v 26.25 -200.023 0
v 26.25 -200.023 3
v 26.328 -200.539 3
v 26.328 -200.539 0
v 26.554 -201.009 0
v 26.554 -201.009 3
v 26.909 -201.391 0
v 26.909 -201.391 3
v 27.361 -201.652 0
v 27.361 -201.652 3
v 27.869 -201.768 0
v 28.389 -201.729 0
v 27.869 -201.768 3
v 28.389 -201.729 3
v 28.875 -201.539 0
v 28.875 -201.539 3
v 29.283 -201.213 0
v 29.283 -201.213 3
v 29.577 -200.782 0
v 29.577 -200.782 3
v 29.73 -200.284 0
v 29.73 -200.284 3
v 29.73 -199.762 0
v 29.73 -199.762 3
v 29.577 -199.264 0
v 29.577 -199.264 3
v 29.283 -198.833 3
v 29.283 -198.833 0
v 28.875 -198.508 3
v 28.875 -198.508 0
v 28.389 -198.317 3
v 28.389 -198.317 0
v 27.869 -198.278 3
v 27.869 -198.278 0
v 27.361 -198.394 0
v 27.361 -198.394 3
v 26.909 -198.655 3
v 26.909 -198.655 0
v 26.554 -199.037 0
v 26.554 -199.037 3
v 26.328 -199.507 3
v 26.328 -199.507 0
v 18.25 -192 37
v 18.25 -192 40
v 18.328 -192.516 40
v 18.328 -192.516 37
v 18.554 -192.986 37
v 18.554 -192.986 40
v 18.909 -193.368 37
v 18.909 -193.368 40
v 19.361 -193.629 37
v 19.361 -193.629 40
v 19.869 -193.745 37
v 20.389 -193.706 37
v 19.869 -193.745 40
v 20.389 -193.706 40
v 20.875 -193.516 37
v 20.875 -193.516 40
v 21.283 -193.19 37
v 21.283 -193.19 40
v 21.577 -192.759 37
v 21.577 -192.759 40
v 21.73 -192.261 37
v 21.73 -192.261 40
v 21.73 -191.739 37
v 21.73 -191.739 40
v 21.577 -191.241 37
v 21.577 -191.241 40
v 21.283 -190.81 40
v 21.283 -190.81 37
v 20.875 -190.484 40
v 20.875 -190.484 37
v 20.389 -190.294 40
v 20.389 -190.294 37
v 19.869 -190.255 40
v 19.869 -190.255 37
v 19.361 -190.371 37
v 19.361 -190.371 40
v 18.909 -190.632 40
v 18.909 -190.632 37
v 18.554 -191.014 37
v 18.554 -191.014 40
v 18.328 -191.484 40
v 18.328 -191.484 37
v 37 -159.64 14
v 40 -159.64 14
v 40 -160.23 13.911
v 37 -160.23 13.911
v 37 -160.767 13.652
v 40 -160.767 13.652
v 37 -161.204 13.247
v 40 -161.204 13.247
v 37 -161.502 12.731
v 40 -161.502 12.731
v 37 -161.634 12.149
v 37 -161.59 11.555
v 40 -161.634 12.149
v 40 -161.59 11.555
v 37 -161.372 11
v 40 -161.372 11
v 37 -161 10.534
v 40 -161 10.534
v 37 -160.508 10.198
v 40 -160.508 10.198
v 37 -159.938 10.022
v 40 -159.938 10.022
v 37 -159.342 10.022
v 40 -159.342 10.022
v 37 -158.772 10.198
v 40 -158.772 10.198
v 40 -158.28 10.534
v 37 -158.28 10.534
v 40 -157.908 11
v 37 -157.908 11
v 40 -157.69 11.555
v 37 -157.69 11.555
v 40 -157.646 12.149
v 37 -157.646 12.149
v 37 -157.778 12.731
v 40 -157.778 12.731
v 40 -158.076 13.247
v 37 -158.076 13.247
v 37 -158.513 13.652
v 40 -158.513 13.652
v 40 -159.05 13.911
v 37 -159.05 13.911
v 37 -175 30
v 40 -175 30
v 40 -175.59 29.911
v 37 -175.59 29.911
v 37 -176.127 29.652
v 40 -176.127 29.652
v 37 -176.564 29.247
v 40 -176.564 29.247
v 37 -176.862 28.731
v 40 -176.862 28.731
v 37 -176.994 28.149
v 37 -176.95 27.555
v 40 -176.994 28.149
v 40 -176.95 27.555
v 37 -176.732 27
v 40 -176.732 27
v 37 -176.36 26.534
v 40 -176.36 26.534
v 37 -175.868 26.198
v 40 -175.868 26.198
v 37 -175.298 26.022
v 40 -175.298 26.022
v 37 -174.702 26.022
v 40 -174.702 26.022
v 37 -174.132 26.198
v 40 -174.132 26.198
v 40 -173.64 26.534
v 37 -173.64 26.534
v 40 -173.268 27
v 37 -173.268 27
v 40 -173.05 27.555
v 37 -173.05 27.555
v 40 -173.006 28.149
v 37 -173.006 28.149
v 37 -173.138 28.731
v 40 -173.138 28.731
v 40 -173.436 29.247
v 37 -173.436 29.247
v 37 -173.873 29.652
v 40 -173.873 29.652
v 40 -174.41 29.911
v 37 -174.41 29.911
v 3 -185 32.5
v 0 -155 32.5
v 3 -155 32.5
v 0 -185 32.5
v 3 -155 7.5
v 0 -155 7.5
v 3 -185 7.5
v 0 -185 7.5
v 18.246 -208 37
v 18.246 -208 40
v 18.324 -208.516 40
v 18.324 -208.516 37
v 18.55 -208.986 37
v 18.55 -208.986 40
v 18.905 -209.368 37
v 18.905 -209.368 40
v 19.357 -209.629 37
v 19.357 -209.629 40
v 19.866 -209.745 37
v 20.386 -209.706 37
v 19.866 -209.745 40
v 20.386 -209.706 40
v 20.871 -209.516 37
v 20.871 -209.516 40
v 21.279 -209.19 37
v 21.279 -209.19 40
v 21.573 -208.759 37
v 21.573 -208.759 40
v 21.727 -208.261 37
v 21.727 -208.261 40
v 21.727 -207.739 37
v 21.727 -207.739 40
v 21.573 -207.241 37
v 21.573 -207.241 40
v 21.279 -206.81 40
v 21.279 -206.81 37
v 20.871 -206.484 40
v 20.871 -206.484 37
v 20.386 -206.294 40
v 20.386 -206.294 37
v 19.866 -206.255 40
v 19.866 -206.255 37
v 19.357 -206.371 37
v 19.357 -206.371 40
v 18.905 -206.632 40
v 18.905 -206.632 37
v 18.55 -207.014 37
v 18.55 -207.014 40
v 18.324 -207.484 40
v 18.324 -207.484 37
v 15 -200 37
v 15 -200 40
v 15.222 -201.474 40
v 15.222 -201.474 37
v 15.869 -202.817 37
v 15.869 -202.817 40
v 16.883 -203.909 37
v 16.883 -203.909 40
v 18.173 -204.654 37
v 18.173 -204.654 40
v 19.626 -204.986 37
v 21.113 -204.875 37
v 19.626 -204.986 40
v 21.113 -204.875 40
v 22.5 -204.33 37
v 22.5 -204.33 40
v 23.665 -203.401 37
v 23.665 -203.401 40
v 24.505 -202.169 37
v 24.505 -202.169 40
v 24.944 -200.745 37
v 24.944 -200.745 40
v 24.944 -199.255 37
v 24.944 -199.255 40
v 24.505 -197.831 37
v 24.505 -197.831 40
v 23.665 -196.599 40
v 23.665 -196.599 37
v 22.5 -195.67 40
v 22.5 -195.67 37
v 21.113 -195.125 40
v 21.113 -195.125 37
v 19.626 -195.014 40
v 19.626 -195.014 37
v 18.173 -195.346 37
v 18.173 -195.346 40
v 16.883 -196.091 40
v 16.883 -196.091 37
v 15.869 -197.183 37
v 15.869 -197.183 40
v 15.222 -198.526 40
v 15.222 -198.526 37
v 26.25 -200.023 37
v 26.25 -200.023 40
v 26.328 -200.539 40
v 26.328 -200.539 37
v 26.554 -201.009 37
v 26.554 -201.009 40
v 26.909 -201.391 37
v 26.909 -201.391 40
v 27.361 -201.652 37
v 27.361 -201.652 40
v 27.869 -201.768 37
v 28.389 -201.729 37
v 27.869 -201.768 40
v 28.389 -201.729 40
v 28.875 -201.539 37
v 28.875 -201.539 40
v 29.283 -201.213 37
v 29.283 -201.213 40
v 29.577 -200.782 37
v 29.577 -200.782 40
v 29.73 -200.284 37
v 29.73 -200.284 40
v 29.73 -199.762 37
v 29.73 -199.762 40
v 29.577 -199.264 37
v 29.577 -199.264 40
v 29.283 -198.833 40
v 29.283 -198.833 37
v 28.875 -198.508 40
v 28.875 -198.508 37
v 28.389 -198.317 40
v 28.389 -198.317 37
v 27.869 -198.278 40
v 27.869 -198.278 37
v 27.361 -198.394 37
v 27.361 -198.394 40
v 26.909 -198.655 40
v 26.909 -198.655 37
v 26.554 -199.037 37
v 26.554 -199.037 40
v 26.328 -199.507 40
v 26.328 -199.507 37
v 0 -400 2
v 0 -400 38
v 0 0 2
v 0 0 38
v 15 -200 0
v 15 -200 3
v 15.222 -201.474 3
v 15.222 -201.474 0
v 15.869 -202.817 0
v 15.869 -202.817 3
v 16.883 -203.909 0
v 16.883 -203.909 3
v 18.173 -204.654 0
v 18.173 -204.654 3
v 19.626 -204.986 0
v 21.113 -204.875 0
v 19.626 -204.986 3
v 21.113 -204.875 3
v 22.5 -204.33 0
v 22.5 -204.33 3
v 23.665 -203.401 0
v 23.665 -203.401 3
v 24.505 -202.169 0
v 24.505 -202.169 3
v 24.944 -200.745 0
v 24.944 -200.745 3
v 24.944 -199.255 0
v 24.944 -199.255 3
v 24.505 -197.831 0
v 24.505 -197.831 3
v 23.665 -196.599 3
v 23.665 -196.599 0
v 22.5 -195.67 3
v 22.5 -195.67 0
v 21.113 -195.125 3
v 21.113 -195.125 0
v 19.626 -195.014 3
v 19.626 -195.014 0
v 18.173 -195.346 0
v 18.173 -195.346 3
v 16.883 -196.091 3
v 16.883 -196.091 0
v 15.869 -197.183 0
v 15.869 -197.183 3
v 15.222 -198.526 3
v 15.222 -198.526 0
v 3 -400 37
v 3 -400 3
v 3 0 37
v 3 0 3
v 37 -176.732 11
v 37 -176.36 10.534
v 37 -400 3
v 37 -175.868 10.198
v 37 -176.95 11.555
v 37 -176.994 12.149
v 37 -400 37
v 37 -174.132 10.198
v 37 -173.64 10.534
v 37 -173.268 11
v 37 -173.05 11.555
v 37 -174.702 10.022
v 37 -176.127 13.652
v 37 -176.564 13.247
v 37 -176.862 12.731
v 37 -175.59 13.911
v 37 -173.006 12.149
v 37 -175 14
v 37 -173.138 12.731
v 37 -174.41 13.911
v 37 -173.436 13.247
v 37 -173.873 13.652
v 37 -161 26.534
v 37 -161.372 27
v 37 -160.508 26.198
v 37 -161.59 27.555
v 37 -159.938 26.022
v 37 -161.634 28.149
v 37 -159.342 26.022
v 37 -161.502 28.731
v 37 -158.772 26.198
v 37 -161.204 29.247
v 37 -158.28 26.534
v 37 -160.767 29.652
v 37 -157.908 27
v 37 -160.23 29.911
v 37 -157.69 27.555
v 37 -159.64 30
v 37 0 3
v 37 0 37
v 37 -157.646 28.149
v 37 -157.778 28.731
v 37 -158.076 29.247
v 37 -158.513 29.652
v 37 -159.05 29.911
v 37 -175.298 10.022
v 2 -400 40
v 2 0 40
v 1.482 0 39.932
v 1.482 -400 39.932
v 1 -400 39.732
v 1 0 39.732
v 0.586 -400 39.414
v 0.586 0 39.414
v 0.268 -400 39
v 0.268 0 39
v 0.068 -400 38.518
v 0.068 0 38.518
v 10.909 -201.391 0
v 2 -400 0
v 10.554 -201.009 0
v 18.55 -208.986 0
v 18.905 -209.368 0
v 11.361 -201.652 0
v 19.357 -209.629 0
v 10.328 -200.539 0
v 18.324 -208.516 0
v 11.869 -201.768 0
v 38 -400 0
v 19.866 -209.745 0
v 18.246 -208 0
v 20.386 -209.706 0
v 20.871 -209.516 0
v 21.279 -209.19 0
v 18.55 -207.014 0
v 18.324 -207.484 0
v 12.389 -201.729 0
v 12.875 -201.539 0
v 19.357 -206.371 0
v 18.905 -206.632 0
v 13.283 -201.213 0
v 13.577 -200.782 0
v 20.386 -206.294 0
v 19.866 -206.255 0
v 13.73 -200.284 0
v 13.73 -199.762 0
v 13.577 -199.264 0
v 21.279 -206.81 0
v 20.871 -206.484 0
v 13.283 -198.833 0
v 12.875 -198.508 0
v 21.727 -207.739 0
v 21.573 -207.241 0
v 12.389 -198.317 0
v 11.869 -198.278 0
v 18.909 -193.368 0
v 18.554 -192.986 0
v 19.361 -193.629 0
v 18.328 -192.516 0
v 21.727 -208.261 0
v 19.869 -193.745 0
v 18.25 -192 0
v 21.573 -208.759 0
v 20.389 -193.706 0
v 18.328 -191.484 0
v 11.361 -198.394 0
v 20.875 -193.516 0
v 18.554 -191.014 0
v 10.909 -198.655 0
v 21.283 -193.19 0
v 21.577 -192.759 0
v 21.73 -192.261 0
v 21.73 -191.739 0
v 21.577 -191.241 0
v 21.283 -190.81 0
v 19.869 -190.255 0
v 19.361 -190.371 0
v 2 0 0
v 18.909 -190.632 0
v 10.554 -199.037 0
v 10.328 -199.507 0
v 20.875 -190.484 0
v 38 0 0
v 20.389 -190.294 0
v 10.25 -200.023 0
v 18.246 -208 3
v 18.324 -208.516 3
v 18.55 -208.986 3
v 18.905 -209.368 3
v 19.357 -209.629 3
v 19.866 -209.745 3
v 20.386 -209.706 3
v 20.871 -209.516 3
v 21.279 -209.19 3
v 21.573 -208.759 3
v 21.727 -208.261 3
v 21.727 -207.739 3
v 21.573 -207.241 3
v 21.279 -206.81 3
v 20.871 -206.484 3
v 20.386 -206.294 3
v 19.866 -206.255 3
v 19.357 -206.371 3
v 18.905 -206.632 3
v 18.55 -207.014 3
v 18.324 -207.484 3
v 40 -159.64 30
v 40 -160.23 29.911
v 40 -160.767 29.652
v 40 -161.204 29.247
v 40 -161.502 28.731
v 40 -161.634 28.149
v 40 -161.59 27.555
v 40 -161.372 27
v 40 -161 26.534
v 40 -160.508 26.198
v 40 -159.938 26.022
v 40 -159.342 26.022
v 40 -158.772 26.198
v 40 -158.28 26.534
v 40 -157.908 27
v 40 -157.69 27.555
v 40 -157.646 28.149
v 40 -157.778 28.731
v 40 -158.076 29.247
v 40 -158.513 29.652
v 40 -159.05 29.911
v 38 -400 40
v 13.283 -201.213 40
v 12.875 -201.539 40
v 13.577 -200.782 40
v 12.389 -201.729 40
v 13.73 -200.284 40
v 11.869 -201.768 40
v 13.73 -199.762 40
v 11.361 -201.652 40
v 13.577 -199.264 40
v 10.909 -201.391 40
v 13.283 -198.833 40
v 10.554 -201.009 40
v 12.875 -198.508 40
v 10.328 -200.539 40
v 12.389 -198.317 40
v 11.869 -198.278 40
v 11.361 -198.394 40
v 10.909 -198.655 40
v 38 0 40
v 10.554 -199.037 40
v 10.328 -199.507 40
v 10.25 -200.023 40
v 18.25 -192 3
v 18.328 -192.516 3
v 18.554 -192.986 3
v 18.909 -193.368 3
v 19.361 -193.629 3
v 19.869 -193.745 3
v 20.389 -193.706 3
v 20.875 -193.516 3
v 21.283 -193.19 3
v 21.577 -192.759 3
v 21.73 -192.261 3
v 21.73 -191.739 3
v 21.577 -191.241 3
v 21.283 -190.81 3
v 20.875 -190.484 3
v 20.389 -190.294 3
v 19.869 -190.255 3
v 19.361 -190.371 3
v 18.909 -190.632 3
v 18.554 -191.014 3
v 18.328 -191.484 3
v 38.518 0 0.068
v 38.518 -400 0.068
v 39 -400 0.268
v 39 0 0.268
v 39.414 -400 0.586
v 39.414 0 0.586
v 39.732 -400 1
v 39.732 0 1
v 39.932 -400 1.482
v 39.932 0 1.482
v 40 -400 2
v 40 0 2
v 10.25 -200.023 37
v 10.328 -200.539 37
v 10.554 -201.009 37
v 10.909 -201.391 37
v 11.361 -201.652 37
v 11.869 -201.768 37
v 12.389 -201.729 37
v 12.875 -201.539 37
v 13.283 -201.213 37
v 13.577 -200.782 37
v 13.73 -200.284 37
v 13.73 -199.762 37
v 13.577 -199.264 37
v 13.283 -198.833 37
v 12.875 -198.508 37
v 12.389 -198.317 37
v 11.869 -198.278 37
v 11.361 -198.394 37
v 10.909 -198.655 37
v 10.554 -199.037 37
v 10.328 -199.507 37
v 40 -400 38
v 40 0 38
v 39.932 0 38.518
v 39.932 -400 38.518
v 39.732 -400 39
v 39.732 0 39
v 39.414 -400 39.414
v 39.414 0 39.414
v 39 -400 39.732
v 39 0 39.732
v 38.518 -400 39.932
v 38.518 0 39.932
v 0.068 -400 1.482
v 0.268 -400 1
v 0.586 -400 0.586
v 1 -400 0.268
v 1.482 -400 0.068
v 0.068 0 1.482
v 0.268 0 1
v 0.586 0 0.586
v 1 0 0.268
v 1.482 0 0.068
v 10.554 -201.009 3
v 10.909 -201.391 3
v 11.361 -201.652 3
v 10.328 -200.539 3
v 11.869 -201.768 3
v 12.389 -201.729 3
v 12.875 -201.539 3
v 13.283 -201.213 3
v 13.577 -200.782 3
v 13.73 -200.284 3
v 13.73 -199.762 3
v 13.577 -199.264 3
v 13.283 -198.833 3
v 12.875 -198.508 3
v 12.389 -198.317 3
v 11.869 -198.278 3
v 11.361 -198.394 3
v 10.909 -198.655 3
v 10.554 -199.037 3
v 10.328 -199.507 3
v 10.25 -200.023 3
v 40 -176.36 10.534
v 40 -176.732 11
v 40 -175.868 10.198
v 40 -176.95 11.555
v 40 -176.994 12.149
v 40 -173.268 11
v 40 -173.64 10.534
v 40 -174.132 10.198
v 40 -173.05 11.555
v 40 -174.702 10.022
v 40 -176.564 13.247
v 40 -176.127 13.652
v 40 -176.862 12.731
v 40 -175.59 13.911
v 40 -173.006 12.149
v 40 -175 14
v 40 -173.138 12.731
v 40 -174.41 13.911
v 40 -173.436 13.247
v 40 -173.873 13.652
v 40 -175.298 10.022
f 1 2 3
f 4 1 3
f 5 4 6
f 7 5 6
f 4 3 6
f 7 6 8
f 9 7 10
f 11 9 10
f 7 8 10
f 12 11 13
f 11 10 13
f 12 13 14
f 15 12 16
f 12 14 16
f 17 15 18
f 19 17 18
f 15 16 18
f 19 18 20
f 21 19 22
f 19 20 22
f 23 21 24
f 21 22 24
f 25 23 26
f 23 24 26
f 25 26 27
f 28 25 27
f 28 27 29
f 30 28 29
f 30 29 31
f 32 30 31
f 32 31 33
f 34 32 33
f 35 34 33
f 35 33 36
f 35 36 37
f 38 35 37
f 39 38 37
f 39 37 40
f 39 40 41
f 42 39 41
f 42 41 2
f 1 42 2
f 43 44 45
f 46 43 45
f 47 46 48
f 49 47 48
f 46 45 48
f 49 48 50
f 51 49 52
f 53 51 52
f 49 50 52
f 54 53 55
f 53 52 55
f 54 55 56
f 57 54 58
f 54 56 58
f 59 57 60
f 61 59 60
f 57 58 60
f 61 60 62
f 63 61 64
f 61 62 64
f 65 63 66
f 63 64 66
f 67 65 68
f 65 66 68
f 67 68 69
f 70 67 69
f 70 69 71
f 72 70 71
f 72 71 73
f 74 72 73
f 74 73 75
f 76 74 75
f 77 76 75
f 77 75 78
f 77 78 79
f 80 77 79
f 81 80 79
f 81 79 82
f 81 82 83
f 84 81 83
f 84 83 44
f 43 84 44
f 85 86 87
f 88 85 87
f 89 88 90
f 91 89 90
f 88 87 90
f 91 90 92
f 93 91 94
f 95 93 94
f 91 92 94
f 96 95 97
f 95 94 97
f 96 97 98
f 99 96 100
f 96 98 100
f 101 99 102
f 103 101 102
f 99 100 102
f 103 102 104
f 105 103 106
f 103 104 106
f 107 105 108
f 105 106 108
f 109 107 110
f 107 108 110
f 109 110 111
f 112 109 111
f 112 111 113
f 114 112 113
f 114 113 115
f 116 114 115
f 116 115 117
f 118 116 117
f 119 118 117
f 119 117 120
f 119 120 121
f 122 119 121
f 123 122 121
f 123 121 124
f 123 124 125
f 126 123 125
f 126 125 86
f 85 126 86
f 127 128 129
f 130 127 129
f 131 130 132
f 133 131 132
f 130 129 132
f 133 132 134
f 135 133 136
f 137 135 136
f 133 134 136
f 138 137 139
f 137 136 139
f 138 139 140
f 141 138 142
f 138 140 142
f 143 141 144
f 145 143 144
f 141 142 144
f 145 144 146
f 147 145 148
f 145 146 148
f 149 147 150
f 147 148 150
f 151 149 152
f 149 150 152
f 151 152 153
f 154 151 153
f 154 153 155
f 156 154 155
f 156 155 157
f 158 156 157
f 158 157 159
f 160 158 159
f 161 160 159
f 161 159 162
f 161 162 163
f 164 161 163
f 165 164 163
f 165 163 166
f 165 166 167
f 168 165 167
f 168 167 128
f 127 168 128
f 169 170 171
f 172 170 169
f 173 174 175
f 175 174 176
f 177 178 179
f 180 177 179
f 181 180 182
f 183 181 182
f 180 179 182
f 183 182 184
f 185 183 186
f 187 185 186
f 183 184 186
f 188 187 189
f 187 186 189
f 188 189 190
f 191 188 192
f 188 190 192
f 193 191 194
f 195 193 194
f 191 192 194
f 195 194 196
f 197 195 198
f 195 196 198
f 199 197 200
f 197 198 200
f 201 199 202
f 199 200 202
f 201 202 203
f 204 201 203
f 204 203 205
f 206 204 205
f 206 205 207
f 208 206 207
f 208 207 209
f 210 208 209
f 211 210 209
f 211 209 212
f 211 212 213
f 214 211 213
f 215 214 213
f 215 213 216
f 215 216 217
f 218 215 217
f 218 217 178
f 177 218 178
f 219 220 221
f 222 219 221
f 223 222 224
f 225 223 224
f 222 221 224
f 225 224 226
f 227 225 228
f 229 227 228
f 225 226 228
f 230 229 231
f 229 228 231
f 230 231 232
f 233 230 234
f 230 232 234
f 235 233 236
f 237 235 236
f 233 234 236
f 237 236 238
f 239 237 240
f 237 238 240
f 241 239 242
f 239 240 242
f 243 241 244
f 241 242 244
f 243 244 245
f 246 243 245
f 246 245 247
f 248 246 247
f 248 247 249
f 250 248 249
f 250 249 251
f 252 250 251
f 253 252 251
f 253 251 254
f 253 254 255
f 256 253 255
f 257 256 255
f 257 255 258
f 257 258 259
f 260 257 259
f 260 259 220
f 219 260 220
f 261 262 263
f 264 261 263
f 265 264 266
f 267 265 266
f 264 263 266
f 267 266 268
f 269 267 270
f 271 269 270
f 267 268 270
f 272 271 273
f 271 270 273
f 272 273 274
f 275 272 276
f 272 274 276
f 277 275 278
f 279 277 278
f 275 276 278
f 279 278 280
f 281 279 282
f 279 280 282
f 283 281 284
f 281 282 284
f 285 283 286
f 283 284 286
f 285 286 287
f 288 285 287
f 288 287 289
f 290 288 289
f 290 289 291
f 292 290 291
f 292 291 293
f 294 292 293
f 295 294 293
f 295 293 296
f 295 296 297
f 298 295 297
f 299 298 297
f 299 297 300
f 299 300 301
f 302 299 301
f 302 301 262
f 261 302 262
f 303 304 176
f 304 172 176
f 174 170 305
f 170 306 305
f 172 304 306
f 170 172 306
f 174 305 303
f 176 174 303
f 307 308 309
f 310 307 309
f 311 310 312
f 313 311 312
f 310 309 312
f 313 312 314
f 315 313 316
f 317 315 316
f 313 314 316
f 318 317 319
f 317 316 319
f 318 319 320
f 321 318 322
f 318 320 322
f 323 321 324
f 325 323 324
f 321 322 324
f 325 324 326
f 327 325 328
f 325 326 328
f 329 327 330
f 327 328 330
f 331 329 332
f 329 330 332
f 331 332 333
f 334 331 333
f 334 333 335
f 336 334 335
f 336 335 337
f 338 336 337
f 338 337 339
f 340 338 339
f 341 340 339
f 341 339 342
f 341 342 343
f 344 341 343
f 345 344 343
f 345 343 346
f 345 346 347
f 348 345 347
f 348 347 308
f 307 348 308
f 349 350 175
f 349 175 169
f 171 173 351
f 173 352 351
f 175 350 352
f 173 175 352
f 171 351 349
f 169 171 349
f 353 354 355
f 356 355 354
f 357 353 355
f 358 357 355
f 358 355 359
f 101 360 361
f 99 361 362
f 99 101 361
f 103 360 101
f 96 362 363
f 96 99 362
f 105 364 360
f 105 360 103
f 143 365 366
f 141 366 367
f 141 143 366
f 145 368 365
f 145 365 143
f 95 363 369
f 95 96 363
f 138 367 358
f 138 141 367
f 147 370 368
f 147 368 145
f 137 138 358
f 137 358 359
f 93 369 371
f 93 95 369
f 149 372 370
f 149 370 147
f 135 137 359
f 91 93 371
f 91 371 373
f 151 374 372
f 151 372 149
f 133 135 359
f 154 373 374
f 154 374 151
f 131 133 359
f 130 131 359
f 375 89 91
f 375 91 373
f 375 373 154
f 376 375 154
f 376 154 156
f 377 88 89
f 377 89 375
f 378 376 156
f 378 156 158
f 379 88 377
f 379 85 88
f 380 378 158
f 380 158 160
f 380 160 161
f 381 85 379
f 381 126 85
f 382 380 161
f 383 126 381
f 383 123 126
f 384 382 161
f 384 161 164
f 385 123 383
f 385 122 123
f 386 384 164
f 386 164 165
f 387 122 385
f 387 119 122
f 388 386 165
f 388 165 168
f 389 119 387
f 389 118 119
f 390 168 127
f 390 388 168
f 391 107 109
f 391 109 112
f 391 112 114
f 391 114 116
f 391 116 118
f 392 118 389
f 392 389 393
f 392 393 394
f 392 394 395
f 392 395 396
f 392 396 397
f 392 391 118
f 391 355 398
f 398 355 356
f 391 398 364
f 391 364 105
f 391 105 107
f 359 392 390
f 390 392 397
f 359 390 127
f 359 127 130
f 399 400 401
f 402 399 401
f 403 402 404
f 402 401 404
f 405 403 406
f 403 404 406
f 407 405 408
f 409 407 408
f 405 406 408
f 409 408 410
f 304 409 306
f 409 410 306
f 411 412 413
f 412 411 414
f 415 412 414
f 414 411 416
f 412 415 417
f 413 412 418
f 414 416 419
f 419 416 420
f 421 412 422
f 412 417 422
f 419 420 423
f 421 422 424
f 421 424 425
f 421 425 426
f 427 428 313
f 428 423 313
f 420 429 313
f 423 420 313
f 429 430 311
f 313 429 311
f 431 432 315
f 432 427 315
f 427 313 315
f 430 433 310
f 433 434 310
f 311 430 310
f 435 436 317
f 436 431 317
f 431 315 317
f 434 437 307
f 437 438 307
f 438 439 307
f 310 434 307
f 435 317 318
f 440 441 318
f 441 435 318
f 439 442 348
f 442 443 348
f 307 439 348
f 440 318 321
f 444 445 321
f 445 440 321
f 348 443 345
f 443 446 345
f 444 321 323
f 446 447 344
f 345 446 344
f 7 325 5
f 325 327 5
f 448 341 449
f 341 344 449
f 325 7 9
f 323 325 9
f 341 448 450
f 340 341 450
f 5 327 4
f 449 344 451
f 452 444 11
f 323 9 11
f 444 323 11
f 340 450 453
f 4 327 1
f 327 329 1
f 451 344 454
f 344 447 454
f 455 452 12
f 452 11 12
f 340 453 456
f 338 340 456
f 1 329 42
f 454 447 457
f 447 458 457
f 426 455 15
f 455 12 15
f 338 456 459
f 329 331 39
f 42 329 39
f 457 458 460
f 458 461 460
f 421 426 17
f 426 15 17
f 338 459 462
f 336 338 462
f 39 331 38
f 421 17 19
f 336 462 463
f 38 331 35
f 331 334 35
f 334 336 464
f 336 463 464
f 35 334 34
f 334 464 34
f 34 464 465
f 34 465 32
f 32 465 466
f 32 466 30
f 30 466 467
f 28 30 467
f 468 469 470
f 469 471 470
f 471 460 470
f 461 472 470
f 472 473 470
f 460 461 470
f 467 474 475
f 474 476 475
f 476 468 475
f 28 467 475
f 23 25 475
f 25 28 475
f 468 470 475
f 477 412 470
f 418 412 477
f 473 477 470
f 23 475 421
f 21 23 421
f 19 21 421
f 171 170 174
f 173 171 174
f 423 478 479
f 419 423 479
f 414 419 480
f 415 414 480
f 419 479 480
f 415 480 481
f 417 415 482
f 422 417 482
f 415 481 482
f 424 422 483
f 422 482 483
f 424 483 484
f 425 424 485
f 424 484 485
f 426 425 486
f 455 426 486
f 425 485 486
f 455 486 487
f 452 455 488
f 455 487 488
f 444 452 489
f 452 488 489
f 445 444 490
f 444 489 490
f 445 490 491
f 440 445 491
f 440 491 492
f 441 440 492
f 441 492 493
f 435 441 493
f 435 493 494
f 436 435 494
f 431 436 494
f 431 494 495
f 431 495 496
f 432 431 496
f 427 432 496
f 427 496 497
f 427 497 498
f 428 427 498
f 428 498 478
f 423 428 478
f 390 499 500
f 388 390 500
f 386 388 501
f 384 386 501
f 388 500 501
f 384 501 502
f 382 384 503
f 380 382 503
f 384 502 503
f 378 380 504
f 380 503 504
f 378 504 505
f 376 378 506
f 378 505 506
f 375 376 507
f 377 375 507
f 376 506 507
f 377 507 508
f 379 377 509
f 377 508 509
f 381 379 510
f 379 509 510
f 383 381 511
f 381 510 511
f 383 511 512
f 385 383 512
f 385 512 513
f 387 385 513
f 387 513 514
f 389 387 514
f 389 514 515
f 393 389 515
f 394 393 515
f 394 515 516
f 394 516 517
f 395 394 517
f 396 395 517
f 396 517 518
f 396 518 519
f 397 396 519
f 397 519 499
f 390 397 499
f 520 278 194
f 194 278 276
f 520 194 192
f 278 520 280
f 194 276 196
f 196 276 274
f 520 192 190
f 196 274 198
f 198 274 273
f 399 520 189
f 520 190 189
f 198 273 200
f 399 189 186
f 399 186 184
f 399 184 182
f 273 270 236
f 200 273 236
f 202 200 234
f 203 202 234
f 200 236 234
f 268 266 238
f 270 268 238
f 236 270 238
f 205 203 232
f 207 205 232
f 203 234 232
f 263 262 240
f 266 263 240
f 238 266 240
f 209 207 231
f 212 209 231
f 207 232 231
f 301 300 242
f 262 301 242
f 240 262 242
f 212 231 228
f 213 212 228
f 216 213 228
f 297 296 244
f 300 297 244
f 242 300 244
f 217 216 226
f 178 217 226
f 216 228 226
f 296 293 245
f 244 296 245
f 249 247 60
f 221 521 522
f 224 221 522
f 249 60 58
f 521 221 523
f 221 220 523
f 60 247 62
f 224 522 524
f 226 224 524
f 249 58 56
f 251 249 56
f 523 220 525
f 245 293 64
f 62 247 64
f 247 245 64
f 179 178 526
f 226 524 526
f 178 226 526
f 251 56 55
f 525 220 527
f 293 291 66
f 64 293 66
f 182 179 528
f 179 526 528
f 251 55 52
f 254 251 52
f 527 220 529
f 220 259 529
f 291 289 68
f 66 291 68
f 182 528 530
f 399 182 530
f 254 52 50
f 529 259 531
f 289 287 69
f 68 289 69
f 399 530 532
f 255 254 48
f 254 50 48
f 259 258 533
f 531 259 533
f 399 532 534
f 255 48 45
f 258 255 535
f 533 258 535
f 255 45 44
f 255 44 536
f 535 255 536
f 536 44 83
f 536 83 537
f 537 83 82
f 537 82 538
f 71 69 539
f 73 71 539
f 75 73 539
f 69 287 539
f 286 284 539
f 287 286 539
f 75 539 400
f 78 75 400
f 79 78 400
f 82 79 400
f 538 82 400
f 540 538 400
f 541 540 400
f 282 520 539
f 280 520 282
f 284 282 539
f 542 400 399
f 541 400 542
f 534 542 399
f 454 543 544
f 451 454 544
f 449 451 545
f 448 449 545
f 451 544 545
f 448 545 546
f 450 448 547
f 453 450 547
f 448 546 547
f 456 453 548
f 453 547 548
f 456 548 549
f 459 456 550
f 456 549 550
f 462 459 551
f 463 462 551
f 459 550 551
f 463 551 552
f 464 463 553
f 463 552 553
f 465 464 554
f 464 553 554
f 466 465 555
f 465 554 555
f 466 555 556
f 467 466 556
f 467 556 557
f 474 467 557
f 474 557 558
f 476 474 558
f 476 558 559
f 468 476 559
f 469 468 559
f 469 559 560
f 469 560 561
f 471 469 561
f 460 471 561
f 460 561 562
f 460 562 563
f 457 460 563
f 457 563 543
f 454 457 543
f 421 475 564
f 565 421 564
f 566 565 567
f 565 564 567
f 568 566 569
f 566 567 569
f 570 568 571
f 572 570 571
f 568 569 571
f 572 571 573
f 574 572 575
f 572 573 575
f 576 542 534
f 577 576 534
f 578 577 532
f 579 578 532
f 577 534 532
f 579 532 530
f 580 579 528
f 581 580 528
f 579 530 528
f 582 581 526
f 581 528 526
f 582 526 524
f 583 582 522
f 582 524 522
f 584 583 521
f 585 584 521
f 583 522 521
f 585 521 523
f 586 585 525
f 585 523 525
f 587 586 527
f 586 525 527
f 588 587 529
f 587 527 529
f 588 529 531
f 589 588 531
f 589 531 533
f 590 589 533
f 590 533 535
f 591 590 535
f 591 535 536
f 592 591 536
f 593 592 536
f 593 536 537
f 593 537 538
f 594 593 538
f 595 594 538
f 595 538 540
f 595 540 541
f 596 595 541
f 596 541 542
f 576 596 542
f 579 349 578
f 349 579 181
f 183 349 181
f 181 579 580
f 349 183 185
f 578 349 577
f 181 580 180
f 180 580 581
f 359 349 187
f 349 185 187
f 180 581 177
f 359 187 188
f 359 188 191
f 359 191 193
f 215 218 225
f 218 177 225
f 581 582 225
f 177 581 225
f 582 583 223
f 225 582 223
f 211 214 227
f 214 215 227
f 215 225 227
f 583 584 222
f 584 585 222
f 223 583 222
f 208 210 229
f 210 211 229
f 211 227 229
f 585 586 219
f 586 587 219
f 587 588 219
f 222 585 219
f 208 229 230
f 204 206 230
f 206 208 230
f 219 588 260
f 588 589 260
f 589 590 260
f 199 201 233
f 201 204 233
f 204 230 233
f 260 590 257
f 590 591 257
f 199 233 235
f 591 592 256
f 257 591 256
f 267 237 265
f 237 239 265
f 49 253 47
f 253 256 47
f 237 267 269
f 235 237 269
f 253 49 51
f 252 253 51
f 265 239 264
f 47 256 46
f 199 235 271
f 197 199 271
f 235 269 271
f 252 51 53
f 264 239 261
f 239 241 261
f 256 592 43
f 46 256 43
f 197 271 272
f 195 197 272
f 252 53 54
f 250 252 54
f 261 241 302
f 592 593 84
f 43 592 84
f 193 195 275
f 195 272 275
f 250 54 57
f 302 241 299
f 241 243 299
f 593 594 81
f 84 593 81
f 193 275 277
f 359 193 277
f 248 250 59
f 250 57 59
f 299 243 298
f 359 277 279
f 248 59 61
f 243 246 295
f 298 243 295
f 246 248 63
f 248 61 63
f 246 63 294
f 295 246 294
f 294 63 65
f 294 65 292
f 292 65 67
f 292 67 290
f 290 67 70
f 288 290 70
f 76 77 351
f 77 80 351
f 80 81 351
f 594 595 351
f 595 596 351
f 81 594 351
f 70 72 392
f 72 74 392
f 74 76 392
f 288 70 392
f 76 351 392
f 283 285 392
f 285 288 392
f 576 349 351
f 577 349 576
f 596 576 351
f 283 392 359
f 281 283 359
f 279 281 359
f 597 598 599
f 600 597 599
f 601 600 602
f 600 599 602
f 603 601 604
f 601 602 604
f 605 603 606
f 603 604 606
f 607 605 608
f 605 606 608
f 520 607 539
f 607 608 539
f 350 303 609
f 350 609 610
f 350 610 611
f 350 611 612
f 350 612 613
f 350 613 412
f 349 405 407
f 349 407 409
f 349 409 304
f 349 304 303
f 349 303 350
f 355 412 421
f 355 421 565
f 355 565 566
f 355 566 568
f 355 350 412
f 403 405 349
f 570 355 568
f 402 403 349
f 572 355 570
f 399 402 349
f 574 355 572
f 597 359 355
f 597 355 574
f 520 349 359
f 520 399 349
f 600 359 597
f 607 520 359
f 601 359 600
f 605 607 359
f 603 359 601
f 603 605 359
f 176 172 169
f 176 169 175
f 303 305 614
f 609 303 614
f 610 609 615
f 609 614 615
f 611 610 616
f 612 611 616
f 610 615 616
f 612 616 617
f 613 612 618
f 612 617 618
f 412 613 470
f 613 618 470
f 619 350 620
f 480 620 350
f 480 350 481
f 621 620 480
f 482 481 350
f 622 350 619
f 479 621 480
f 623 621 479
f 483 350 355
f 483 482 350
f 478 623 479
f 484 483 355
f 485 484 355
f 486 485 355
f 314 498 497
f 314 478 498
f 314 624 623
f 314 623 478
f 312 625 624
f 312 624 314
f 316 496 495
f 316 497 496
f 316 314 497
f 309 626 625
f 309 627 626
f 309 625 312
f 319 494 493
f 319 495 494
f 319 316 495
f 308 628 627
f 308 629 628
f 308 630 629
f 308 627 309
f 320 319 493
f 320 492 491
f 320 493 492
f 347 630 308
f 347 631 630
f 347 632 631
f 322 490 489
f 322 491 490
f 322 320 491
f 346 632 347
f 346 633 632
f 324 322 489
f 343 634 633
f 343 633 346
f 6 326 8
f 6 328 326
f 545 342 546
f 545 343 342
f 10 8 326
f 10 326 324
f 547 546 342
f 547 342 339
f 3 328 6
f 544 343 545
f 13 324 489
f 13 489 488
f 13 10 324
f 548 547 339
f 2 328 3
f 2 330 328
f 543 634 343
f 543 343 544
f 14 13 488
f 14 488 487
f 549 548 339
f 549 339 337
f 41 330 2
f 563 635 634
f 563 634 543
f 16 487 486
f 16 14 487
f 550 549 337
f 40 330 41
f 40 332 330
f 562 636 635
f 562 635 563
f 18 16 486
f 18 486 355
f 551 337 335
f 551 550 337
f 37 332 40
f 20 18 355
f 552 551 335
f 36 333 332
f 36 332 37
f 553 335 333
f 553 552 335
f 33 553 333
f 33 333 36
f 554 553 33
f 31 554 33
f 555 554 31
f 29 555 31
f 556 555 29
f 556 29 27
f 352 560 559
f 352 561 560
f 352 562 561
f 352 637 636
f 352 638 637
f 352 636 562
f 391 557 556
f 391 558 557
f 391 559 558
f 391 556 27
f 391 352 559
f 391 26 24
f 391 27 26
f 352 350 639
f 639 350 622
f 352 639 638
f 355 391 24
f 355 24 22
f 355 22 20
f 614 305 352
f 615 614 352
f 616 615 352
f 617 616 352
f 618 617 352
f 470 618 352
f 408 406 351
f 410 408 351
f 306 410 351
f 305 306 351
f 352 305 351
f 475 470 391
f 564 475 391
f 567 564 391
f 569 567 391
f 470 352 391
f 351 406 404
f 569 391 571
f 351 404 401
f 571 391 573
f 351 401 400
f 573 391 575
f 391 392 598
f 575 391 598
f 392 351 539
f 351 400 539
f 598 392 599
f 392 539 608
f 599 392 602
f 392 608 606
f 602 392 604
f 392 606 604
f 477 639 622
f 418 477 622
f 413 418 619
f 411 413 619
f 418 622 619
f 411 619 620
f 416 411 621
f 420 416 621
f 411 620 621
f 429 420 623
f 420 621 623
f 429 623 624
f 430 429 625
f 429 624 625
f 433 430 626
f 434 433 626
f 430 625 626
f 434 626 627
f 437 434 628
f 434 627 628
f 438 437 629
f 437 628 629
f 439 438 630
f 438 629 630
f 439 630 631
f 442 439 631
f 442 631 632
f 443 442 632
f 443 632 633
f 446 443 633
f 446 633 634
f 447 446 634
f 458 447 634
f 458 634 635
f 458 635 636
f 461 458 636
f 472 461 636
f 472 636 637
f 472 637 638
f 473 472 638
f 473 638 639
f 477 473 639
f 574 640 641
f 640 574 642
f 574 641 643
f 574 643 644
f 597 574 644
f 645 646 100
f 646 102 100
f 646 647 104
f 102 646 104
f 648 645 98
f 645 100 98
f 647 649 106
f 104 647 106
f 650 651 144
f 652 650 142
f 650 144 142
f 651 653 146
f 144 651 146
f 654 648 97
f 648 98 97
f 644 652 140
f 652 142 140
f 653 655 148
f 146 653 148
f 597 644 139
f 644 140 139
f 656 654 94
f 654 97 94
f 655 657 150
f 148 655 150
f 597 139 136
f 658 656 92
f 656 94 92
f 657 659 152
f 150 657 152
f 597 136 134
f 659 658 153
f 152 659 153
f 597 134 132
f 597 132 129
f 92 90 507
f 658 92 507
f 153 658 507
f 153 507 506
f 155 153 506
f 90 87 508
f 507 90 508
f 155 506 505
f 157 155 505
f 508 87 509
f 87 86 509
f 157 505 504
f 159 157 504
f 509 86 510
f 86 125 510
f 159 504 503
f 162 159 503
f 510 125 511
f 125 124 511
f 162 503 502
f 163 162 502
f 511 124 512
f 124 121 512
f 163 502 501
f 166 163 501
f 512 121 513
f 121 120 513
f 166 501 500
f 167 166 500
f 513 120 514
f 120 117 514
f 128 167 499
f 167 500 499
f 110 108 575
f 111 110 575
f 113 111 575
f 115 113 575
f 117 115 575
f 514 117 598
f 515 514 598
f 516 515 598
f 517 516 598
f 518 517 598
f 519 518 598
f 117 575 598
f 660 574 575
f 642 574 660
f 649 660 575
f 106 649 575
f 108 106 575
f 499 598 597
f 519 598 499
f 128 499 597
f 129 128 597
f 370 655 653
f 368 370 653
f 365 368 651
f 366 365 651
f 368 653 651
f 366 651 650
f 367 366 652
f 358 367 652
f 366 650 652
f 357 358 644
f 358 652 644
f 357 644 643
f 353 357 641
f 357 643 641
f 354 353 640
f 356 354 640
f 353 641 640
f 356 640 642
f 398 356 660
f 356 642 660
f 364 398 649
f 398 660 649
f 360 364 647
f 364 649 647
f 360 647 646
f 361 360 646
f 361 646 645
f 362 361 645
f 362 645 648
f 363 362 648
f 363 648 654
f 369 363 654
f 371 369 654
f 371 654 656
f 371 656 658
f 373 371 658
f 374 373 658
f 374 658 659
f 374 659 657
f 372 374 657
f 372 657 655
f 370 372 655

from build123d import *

# Parameters (mm, degrees)
SKETCH_W       = 34
SKETCH_H       = 34
PAD_DEPTH      = 400
SKETCH001_R    = 5
HOLE_DEPTH     = 40.001
SKETCH002_R    = 1.75
HOLE001_DEPTH  = 40.001
SKETCH003_R    = 2
HOLE002_DEPTH  = 25
HOLE002_TIPS_R = 2
SKETCH004_W    = 25
SKETCH004_H    = 30
POCKET_DEPTH   = 3


with BuildPart() as part:
    # Sketch → Pad (new body)
    with BuildSketch(Plane.XZ):
        with BuildLine():
            Line((2, 0), (38, 0))
            ThreePointArc((38, 0), (39.414214, 0.585786), (40, 2))
            Line((40, 2), (40, 38))
            ThreePointArc((40, 38), (39.414214, 39.414214), (38, 40))
            Line((38, 40), (2, 40))
            ThreePointArc((2, 40), (0.585786, 39.414214), (0, 38))
            Line((0, 38), (0, 2))
            ThreePointArc((0, 2), (0.585786, 0.585786), (2, 0))
        make_face()
        with Locations((20, 20)):
            Rectangle(SKETCH_W, SKETCH_H, mode=Mode.SUBTRACT)
    extrude(amount=PAD_DEPTH)

    # Sketch001 (on Face5 of Pad) → Hole (cut, through all)
    with BuildSketch(Plane(origin=(0, 0, 40), x_dir=(-1, 0, 0), z_dir=(0, 0, 1))):
        with Locations((-20, 200)):
            Circle(SKETCH001_R)
    extrude(amount=-HOLE_DEPTH, mode=Mode.SUBTRACT)

    # Sketch002 (on Face10 of Hole) → Hole001 (cut, through all)
    with BuildSketch(Plane(origin=(0, 0, 40), x_dir=(-1, 0, 0), z_dir=(0, 0, 1))):
        with Locations((-12.000033, 200.023056)):
            Circle(SKETCH002_R)
        with Locations((-27.999967, 200.023056)):
            Circle(SKETCH002_R)
        with Locations((-20, 192)):
            Circle(SKETCH002_R)
        with Locations((-19.996319, 207.999999)):
            Circle(SKETCH002_R)
    extrude(amount=-HOLE001_DEPTH, mode=Mode.SUBTRACT)

    # Sketch003 (on Face12 of Hole001) → Hole002 (cut)
    with BuildSketch(Plane(origin=(40, 0, 0), x_dir=(0, 0, 1), z_dir=(1, 0, 0))):
        with Locations((28, 175)):
            Circle(SKETCH003_R)
        with Locations((12, 175)):
            Circle(SKETCH003_R)
        with Locations((28, 159.64)):
            Circle(SKETCH003_R)
        with Locations((12, 159.64)):
            Circle(SKETCH003_R)
    extrude(amount=-HOLE002_DEPTH, mode=Mode.SUBTRACT)

    # Hole002 tips → Hole002 tip 1 section 0
    with BuildSketch(Plane(origin=(15, 0, 0), x_dir=(0, 0, 1), z_dir=(1, 0, 0)), mode=Mode.PRIVATE) as hole002_tip_1_s0:
        with Locations((28, 175)):
            Circle(HOLE002_TIPS_R)
    loft([hole002_tip_1_s0.sketch, Vertex(13.798279, -175, 28)], mode=Mode.SUBTRACT)

    # Hole002 tips → Hole002 tip 2 section 0
    with BuildSketch(Plane(origin=(15, 0, 0), x_dir=(0, 0, 1), z_dir=(1, 0, 0)), mode=Mode.PRIVATE) as hole002_tip_2_s0:
        with Locations((12, 175)):
            Circle(HOLE002_TIPS_R)
    loft([hole002_tip_2_s0.sketch, Vertex(13.798279, -175, 12)], mode=Mode.SUBTRACT)

    # Hole002 tips → Hole002 tip 3 section 0
    with BuildSketch(Plane(origin=(15, 0, 0), x_dir=(0, 0, 1), z_dir=(1, 0, 0)), mode=Mode.PRIVATE) as hole002_tip_3_s0:
        with Locations((28, 159.64)):
            Circle(HOLE002_TIPS_R)
    loft([hole002_tip_3_s0.sketch, Vertex(13.798279, -159.64, 28)], mode=Mode.SUBTRACT)

    # Hole002 tips → Hole002 tip 4 section 0
    with BuildSketch(Plane(origin=(15, 0, 0), x_dir=(0, 0, 1), z_dir=(1, 0, 0)), mode=Mode.PRIVATE) as hole002_tip_4_s0:
        with Locations((12, 159.64)):
            Circle(HOLE002_TIPS_R)
    loft([hole002_tip_4_s0.sketch, Vertex(13.798279, -159.64, 12)], mode=Mode.SUBTRACT)

    # Sketch004 (on Face11 of Hole002) → Pocket (cut)
    with BuildSketch(Plane(origin=(0, 0, 0), x_dir=(0, 0, -1), z_dir=(-1, 0, 0))):
        with Locations((-20, 170)):
            Rectangle(SKETCH004_W, SKETCH004_H)
    extrude(amount=-POCKET_DEPTH, mode=Mode.SUBTRACT)


solid = part.part
